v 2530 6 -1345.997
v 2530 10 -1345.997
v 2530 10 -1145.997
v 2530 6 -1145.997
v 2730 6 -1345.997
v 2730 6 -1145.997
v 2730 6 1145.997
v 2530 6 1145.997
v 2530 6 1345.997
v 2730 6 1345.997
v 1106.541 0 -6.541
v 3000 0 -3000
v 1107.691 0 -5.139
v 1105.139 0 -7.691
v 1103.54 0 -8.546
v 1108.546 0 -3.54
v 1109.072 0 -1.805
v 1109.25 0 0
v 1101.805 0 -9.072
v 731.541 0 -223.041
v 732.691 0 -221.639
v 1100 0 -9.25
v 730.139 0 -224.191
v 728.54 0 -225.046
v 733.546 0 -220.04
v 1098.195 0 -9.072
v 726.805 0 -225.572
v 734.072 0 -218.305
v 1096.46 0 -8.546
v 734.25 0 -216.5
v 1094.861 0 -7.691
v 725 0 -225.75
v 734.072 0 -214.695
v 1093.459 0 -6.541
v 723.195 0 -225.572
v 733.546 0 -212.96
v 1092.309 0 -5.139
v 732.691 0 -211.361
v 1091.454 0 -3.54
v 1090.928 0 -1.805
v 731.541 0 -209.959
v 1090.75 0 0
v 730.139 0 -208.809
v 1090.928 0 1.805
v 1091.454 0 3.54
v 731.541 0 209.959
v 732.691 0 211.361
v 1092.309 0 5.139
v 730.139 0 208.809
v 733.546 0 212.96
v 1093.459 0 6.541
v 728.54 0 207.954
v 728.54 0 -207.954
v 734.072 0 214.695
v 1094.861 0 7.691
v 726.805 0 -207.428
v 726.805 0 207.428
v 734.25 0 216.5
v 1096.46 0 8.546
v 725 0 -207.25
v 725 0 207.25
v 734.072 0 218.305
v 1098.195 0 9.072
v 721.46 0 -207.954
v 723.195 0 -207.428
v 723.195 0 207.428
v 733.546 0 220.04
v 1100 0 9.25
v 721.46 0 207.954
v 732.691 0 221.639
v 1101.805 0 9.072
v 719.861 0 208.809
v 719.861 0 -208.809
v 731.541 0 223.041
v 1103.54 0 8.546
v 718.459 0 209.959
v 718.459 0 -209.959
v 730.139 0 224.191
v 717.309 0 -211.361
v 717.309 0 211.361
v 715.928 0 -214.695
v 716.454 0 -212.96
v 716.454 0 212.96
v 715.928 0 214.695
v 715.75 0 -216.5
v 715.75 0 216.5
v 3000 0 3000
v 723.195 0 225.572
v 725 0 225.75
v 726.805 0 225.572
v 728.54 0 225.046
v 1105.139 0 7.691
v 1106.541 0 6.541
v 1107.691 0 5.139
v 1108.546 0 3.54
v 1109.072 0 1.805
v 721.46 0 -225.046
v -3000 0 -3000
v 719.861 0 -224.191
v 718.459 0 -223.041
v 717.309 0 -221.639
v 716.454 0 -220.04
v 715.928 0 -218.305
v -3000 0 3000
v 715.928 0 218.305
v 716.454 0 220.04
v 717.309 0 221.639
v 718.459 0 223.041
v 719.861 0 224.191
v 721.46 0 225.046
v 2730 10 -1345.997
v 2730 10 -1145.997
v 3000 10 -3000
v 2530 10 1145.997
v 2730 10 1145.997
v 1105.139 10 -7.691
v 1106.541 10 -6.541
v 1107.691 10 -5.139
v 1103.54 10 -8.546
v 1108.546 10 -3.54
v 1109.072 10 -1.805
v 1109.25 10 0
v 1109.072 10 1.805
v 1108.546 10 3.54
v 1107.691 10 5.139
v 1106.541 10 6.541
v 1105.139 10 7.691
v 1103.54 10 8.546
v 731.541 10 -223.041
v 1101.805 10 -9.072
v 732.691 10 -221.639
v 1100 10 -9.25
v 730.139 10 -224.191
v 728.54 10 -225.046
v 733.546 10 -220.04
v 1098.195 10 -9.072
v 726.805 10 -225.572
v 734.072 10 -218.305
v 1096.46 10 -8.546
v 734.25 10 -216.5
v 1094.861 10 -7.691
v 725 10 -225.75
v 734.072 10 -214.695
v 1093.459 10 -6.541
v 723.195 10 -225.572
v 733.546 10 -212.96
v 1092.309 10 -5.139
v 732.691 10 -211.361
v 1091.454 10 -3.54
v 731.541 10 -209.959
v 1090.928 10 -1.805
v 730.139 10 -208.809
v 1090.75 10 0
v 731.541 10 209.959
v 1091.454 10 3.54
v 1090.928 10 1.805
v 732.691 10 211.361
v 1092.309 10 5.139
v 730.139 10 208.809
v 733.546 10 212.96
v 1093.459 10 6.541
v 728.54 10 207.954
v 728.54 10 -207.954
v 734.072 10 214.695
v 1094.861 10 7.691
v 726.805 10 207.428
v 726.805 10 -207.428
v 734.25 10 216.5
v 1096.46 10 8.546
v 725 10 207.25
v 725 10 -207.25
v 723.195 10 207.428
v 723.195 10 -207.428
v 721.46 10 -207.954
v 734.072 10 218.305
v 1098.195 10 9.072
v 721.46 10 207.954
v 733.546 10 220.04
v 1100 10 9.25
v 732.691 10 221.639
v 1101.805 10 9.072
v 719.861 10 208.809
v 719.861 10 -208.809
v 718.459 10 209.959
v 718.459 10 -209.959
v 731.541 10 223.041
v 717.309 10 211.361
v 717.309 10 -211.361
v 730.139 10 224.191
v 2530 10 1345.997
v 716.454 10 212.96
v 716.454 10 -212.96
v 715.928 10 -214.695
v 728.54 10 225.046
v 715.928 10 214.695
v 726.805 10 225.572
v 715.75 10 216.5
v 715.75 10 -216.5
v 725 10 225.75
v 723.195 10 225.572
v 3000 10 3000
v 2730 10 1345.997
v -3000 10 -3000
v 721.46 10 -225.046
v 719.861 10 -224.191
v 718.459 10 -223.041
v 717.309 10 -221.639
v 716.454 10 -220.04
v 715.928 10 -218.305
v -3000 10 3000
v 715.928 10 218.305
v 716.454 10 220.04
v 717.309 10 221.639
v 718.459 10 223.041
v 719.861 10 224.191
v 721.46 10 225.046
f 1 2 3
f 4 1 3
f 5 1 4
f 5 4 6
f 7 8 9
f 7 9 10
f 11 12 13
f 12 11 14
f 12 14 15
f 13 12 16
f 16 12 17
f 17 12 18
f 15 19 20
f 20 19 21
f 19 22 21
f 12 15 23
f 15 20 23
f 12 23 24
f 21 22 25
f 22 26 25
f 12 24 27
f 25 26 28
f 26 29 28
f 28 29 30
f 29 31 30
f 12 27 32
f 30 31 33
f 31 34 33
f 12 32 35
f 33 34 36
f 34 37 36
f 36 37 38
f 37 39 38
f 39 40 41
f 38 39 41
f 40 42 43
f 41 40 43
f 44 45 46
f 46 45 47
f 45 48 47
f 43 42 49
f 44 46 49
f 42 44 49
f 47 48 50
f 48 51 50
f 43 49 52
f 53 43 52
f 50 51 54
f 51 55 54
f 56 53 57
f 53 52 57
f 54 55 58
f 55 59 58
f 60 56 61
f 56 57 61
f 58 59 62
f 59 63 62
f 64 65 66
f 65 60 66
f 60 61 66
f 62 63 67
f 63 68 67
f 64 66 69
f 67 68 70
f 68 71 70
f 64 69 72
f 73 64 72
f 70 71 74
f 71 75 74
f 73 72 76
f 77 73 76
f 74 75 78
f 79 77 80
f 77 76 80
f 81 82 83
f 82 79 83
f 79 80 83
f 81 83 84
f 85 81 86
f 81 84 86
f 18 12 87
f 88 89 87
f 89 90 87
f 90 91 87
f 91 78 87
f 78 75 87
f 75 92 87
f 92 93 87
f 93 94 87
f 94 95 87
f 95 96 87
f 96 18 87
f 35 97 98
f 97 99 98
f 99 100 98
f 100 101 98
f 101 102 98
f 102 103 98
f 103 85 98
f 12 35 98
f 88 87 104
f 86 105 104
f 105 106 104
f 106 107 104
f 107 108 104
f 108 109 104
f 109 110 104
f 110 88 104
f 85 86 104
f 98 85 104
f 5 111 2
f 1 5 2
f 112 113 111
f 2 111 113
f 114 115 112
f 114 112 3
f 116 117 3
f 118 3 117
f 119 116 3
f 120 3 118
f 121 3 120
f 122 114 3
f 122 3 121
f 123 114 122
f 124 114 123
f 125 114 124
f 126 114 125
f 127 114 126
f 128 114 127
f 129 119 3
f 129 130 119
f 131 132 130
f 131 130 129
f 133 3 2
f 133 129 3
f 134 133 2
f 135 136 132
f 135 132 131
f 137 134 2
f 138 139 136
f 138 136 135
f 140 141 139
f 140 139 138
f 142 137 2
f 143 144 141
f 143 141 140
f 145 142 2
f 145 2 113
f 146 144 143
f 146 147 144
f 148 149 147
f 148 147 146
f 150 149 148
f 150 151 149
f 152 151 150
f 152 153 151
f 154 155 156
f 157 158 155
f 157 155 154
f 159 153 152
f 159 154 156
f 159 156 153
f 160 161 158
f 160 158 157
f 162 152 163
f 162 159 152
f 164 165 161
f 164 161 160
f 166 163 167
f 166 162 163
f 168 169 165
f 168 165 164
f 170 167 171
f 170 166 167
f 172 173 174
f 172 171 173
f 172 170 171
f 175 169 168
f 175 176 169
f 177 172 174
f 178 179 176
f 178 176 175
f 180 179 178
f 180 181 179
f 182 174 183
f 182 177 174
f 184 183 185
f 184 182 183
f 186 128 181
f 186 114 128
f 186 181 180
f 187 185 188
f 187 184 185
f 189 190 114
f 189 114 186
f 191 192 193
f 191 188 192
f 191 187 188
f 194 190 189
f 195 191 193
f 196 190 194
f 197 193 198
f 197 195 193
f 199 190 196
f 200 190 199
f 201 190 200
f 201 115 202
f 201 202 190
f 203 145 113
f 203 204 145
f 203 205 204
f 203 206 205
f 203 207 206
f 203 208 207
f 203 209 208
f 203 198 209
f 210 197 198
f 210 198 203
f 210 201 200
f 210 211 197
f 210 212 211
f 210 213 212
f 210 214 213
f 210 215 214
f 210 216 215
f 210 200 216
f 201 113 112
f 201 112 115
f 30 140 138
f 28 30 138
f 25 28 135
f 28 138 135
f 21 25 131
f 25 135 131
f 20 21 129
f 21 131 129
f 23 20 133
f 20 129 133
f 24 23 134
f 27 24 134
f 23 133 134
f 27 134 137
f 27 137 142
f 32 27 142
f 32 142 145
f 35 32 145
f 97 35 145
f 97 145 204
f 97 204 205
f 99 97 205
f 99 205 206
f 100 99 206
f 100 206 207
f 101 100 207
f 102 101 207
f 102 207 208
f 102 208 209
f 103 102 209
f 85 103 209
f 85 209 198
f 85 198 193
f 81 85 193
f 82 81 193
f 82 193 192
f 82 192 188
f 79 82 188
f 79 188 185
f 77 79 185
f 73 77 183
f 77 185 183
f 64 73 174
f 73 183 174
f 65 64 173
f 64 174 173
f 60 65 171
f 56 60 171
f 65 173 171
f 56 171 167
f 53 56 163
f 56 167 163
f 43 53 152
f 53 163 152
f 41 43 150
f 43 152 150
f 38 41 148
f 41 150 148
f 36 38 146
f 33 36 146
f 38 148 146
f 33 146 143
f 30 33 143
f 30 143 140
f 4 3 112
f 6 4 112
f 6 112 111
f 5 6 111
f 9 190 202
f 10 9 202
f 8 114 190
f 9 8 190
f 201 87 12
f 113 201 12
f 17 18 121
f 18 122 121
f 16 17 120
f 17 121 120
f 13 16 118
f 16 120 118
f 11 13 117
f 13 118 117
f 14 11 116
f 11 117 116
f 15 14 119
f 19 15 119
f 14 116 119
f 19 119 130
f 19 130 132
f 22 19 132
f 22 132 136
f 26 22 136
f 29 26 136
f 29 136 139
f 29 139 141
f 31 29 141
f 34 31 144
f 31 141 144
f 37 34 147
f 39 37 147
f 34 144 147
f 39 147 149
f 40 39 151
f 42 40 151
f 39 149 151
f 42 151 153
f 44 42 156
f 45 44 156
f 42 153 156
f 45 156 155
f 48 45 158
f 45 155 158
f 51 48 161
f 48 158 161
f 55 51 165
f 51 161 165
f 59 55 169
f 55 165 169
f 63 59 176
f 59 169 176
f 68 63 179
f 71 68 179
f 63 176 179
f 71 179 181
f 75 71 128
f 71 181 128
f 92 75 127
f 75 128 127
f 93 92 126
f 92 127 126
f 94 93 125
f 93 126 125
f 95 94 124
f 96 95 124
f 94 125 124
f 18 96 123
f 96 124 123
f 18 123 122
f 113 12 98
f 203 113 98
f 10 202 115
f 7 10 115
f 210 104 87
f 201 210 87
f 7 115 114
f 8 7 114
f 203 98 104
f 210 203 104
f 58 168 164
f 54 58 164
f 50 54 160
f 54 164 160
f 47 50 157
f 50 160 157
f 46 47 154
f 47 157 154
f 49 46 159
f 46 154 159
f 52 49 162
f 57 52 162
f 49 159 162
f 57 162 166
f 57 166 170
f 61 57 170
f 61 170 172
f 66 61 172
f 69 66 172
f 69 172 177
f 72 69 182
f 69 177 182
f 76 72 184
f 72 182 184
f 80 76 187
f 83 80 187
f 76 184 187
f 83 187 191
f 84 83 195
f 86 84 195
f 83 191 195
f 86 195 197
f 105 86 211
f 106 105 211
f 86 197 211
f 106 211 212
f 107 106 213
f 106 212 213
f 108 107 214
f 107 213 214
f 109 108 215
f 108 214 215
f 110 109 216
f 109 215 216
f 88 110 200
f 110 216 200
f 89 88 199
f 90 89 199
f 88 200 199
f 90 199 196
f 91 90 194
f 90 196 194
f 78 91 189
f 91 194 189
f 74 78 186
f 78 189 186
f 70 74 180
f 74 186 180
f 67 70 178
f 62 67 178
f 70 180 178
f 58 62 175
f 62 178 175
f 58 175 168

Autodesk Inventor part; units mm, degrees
ref_plane "YZ Plane" through (0, 0, 0) normal (1, 0, 0) x (0, 1, 0)
ref_plane "XZ Plane" through (0, 0, 0) normal (0, 1, 0) x (-1, 0, 0)
ref_plane "XY Plane" through (0, 0, 0) normal (0, 0, 1) x (1, 0, 0)
sketch "Boceto1" plane through (0, 0, 0) normal (0, 1, 0) x (-1, 0, 0)
  line L0 (3000, 3000) -> (-3000, 3000)
  line L1 (-3000, 3000) -> (-3000, -3000)
  line L2 (-3000, -3000) -> (3000, -3000)
  line L3 (3000, -3000) -> (3000, 3000)
  point P0 (0, 0)
  dimension "d0" = 6000
  dimension "d1" = 6000
extrude "Extrusión1" add sketch "Boceto1" along normal blind 10
sketch "Boceto2" plane through (0, 10, 0) normal (0, 1, 0) x (1, 0, 0)
  circle A0 centre (1100, 0) radius 9.25
  line L0 (3000, -3000) -> (3000, 3000) projected
  circle A1 centre (725, 0) radius 9.25
  circle A2 centre (725, -216.5) radius 9.25
  circle A3 centre (725, 216.5) radius 9.25
  point P0 (0, 0)
  dimension "d4" = 18.5
  dimension "d5" = 1900
  dimension "d6" = 18.5
  dimension "d7" = 375
  dimension "d8" = 18.5
  dimension "d9" = 18.5
  dimension "d10" = 216.5
  dimension "d14" = 375
extrude "Extrusión2" cut sketch "Boceto2" against normal blind 10 contours A0 | A2 | A3
sketch "Boceto3" plane through (0, 10, 0) normal (0, 1, 0) x (1, 0, 0)
  line L0 (2730, -1145.997) -> (2530, -1145.997)
  line L1 (2530, -1145.997) -> (2530, -1345.997)
  line L2 (2530, -1345.997) -> (2730, -1345.997)
  line L3 (2730, -1345.997) -> (2730, -1145.997)
  line L4 (2730, 1345.9966) -> (2530, 1345.9966)
  line L5 (2530, 1345.9966) -> (2530, 1145.9966)
  line L6 (2530, 1145.9966) -> (2730, 1145.9966)
  line L7 (2730, 1145.9966) -> (2730, 1345.9966)
  circle A0 centre (1100, 0) radius 9.25 projected
  point P0 (0, 0)
  point P1 (2630, -1345.997)
  point P2 (2630, 1345.9966)
  point P3 (2730, -1245.997)
  dimension "d15" = 200
  dimension "d16" = 200
  dimension "d17" = 200
  dimension "d18" = 2691.9936
  dimension "d19" = 1345.997
  dimension "d21" = 1630
extrude "Extrusión3" cut sketch "Boceto3" against normal blind 4 contours L3 L2 L1 L0 | L7 L6 L5 L4
properties part number "Piso"
